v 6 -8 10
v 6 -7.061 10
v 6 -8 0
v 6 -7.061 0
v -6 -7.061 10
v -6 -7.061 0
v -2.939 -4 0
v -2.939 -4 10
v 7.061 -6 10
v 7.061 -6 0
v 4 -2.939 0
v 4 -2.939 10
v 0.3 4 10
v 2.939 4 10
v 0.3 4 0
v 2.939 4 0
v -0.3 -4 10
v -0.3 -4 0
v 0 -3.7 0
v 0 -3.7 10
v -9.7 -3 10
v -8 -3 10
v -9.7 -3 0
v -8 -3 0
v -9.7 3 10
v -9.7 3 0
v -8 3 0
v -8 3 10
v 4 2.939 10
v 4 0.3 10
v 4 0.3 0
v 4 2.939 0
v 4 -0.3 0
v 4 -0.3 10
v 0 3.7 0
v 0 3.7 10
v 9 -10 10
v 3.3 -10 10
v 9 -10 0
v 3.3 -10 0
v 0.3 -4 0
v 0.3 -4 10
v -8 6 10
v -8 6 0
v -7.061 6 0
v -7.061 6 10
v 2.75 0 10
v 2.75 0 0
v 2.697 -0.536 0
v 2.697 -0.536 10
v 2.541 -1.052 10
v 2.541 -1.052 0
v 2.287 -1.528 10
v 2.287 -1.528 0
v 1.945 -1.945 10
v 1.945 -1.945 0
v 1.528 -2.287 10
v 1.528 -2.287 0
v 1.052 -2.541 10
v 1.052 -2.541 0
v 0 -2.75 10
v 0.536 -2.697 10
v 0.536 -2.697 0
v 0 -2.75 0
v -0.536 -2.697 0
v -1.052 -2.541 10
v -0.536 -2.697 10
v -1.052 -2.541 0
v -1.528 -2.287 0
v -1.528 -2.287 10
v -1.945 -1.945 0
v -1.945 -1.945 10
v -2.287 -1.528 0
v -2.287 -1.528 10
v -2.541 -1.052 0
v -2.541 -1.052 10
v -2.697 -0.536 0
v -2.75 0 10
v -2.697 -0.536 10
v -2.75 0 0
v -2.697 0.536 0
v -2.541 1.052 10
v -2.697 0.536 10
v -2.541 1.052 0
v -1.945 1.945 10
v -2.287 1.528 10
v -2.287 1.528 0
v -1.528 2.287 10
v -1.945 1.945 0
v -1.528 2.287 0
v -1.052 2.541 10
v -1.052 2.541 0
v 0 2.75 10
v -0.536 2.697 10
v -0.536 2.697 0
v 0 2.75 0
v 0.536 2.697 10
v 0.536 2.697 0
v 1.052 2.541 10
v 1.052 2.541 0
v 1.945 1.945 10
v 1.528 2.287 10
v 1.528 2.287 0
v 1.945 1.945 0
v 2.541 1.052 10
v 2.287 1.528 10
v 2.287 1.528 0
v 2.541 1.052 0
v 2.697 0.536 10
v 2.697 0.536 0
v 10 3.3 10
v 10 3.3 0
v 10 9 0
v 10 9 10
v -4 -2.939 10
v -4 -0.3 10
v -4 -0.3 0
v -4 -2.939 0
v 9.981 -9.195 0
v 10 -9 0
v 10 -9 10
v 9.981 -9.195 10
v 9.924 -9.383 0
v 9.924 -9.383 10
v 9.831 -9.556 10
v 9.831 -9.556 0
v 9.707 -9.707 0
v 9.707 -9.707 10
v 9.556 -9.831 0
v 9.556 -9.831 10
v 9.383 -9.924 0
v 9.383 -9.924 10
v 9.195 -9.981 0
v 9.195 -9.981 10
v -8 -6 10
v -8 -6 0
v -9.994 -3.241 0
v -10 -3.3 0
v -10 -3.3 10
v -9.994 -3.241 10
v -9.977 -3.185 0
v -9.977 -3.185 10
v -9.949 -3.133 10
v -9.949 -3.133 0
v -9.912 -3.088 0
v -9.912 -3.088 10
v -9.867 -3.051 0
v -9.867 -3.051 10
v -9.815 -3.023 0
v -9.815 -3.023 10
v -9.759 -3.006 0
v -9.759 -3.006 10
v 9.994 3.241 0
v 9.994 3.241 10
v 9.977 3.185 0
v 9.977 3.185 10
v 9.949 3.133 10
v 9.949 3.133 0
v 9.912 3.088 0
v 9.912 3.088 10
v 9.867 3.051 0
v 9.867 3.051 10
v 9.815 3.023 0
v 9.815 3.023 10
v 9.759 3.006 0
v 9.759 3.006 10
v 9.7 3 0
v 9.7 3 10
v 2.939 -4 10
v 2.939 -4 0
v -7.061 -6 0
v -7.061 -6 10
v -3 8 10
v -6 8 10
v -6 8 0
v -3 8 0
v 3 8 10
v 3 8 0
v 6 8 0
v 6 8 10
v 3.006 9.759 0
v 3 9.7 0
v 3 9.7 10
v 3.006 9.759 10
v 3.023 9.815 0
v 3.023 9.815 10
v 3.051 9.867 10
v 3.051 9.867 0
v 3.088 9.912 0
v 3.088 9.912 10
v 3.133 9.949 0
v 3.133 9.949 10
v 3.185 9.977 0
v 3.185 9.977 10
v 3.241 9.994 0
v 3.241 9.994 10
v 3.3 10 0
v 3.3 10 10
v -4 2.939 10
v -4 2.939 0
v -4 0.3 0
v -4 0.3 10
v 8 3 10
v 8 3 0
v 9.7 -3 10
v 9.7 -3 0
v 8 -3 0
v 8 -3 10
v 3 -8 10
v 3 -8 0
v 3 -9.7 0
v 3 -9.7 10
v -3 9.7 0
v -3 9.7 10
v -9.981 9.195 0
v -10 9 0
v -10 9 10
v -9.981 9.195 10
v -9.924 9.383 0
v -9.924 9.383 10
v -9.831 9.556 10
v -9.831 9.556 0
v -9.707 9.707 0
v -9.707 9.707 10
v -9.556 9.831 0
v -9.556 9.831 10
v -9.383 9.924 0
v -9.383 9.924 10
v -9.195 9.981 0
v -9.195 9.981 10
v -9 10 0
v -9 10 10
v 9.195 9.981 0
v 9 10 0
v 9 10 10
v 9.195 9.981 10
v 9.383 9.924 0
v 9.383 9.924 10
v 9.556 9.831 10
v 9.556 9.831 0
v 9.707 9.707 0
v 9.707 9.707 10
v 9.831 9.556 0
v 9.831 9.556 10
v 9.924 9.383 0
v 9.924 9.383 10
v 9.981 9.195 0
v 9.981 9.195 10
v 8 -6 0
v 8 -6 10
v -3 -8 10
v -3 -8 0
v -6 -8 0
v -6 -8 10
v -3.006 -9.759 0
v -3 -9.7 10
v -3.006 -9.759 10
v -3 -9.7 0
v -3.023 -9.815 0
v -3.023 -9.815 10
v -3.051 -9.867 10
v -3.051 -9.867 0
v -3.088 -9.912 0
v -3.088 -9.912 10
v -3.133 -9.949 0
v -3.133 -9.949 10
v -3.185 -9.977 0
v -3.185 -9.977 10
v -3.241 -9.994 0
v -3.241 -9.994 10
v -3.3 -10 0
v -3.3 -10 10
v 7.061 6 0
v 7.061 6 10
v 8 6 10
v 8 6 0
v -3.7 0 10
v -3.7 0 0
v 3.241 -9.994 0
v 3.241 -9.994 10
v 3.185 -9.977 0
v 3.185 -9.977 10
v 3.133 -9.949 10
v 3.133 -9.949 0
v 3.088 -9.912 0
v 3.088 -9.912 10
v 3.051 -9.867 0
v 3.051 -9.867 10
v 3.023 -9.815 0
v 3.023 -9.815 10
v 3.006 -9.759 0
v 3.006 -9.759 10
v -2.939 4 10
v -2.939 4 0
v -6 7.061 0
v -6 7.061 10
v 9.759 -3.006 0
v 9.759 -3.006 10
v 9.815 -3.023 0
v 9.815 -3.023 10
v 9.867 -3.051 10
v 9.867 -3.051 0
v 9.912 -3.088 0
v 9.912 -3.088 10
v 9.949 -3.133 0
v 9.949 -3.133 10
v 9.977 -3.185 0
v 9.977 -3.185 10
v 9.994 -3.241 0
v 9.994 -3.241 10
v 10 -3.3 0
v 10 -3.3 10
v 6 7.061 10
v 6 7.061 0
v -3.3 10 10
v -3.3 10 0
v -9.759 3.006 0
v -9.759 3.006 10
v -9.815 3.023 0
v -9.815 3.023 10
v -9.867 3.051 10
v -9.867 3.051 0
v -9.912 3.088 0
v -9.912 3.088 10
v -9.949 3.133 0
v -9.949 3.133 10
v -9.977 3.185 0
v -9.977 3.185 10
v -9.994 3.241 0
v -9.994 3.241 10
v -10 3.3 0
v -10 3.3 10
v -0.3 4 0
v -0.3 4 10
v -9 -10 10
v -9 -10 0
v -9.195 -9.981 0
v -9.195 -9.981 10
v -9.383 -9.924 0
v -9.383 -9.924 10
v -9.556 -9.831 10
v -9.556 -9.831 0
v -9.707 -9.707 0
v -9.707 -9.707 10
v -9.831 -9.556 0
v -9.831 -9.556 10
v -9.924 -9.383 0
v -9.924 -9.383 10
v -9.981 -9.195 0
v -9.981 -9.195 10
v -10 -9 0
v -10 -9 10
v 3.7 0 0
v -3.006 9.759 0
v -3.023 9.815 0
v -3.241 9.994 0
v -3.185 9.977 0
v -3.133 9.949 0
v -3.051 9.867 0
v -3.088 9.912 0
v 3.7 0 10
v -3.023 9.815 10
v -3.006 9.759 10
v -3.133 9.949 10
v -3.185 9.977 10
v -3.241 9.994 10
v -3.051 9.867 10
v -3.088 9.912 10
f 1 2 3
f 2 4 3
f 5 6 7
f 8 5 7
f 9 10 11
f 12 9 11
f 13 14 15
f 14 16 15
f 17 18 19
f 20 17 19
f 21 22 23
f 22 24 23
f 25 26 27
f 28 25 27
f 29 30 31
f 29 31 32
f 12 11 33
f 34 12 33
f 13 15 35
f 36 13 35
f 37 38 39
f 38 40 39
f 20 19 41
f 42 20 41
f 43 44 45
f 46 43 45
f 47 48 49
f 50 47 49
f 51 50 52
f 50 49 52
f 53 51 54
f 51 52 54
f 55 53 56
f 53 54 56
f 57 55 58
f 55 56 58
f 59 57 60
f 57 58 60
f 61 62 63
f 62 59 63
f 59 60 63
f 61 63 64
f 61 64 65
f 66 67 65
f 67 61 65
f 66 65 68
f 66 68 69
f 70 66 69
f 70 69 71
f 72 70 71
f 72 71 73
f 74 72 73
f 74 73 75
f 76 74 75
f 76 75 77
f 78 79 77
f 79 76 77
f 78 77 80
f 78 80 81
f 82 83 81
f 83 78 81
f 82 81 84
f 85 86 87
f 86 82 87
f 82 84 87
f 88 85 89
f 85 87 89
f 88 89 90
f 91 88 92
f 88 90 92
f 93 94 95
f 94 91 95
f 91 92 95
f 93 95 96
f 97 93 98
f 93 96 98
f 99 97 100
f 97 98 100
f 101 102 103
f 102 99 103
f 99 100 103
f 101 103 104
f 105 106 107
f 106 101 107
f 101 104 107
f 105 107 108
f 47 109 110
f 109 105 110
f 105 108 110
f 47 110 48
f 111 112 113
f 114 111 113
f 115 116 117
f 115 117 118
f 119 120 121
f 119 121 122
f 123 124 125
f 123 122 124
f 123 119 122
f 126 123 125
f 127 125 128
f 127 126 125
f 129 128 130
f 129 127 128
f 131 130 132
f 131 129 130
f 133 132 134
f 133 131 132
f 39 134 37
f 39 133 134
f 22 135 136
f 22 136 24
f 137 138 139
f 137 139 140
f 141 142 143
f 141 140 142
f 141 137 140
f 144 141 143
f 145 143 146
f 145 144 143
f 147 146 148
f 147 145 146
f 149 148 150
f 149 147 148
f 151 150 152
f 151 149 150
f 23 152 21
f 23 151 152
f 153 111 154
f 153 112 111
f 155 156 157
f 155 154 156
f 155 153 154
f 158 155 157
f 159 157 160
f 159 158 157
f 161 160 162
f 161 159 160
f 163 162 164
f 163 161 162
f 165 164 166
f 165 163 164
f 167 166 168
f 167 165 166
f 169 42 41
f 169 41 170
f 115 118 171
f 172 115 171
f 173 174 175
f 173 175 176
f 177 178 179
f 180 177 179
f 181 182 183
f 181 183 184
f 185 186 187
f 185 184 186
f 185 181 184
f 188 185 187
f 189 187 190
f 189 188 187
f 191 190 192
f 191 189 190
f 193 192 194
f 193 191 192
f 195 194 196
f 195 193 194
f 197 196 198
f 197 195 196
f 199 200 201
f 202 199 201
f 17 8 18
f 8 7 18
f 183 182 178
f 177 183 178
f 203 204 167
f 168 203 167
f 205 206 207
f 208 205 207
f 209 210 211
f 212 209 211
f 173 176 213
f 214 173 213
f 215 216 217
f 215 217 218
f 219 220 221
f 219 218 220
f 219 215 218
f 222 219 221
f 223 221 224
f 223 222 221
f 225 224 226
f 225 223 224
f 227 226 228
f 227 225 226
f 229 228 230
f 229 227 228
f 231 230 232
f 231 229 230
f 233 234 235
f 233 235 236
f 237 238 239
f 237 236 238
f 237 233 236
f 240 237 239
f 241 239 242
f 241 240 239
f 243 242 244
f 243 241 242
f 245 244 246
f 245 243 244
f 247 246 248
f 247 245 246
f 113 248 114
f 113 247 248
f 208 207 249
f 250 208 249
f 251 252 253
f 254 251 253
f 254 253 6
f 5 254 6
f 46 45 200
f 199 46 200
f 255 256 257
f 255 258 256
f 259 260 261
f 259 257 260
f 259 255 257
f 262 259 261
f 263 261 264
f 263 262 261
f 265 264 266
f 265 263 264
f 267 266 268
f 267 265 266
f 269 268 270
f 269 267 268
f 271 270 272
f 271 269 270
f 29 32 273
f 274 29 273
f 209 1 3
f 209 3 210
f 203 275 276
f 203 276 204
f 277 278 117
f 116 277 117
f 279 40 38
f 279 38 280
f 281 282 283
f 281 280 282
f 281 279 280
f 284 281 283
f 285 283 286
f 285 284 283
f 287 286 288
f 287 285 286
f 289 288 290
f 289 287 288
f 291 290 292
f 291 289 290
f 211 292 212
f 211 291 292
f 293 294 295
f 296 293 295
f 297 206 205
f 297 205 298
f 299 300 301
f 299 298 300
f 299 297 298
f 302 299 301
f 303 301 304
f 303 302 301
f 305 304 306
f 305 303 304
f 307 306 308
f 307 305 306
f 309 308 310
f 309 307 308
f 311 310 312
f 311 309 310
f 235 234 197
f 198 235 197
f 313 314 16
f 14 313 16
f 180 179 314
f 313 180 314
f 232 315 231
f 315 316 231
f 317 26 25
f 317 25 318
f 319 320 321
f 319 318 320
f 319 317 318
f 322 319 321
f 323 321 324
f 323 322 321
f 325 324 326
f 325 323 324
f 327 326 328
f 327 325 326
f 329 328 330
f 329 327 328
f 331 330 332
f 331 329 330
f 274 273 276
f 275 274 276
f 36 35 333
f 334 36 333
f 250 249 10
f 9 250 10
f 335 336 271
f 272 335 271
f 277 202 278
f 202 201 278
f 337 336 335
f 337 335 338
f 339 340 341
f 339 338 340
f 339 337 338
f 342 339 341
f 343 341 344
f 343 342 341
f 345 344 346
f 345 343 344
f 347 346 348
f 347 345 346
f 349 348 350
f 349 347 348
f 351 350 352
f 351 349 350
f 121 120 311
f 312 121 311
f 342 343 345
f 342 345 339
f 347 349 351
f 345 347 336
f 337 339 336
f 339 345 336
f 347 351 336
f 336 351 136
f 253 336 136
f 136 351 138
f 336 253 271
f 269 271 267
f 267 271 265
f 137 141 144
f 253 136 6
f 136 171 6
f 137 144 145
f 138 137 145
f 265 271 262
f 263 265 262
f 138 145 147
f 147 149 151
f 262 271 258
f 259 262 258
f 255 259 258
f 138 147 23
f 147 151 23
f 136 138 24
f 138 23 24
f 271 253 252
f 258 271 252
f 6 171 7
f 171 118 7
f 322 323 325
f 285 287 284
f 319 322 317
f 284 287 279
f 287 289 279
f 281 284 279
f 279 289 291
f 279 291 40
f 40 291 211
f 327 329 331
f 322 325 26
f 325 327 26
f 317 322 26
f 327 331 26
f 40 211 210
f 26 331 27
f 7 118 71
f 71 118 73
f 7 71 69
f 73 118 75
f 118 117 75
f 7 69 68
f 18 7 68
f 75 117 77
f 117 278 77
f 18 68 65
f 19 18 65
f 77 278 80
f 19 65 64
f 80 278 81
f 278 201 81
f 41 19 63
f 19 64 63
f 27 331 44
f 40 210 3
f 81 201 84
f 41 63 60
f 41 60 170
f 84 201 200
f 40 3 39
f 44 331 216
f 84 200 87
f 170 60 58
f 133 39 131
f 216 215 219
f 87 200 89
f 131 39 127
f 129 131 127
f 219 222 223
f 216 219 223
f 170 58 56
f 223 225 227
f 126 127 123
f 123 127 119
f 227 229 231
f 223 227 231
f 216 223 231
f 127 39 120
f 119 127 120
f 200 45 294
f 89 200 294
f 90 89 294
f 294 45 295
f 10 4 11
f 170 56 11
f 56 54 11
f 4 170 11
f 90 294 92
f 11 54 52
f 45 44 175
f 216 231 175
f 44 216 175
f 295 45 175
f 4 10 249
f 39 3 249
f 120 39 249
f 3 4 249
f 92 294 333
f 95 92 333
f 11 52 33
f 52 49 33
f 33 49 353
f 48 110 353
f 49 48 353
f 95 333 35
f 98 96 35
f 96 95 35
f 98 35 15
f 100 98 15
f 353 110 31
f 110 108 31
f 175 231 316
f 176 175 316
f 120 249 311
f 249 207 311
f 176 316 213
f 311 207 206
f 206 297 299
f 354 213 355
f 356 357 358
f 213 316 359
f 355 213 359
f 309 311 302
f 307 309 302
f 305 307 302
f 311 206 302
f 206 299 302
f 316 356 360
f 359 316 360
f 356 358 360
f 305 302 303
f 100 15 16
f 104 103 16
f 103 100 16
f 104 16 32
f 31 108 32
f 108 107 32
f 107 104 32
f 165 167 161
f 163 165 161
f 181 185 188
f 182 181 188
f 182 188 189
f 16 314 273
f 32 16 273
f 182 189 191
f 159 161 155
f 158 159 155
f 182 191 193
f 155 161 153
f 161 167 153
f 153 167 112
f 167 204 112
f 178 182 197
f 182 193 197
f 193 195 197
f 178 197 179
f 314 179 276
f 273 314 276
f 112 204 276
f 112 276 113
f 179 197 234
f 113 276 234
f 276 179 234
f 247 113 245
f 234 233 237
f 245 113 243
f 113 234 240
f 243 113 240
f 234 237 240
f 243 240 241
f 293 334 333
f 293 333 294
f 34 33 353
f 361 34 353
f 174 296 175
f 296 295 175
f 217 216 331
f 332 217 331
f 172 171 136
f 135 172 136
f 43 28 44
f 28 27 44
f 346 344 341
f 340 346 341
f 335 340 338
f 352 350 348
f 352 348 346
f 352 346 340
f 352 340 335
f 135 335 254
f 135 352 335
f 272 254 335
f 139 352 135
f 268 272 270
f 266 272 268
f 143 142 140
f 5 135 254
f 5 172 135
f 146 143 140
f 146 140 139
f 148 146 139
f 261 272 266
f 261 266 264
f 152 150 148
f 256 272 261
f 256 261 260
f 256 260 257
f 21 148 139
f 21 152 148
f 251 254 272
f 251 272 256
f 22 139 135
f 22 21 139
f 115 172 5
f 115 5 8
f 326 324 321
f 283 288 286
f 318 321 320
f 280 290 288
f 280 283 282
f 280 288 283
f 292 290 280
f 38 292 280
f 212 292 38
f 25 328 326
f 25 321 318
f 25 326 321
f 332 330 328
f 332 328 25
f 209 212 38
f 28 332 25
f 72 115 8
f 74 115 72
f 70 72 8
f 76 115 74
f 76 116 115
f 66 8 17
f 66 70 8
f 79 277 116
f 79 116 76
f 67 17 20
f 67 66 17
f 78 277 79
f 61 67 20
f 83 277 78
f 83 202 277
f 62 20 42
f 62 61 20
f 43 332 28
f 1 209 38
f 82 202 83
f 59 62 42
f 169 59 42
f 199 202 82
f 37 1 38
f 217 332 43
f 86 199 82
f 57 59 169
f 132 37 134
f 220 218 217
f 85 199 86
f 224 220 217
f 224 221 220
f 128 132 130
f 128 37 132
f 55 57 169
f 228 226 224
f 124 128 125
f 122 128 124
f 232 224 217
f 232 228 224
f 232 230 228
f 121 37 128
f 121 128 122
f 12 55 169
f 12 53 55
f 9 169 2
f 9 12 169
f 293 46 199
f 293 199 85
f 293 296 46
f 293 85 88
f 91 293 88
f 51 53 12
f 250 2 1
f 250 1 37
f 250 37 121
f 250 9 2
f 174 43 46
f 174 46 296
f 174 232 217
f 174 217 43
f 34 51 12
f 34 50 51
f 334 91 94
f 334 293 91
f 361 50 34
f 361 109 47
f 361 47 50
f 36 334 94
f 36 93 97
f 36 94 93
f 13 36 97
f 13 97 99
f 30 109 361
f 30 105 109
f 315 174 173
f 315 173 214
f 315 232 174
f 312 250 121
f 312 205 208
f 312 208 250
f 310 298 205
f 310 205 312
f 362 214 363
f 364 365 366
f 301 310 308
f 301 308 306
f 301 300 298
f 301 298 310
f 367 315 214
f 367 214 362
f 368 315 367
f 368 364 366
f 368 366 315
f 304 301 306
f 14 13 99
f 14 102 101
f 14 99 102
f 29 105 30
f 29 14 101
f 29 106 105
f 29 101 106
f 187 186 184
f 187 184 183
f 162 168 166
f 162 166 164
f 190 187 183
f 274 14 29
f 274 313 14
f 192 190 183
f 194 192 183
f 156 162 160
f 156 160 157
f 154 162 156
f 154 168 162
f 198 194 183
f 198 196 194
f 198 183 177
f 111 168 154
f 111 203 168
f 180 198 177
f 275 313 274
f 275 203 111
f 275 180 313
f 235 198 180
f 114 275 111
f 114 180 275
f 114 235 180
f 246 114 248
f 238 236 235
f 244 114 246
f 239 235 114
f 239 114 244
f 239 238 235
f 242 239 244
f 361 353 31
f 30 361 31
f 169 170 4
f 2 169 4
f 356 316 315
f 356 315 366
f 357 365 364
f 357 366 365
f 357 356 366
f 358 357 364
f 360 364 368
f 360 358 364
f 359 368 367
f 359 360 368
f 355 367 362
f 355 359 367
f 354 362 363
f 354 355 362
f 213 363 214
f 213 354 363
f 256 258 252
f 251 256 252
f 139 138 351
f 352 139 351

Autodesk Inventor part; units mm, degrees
ref_plane "Startebene" through (0, 0, 0) normal (0, 0, 1) x (1, 0, 0)
ref_plane "Endebene" through (0, 0, 320) normal (0, 0, 1) x (1, 0, 0)
ref_plane "Startebene1" through (0, 0, 0) normal (0, 0, 1) x (1, 0, 0)
ref_plane "Endebene1" through (0, 0, 10) normal (0, 0, 1) x (1, 0, 0)
ref_plane "Startebene2" through (0, 0, 0) normal (0, 0, 1) x (1, 0, 0)
ref_plane "Endebene2" through (0, 0, 10) normal (0, 0, 1) x (1, 0, 0)
sketch "Skizze" plane through (0, 0, 0) normal (0, 0, 1) x (1, 0, 0)
  line L0 (-10, 9) -> (-10, 3.3)
  arc A0 (-10, 3.3) -> (-9.7, 3) centre (-9.7, 3.3) ccw
  line L1 (-9.7, 3) -> (-8, 3)
  line L2 (-8, 3) -> (-8, 6)
  line L3 (-8, 6) -> (-7.0607, 6)
  line L4 (-7.0607, 6) -> (-4, 2.9393)
  line L5 (-4, 2.9393) -> (-4, 0.3)
  line L6 (-4, 0.3) -> (-3.7, 0)
  line L7 (-3.7, 0) -> (-4, -0.3)
  line L8 (-4, -0.3) -> (-4, -2.9393)
  line L9 (-4, -2.9393) -> (-7.0607, -6)
  line L10 (-7.0607, -6) -> (-8, -6)
  line L11 (-8, -6) -> (-8, -3)
  line L12 (-8, -3) -> (-9.7, -3)
  arc A1 (-9.7, -3) -> (-10, -3.3) centre (-9.7, -3.3) ccw
  line L13 (-10, -3.3) -> (-10, -9)
  arc A2 (-10, -9) -> (-9, -10) centre (-9, -9) ccw
  line L14 (-9, -10) -> (-3.3, -10)
  arc A3 (-3.3, -10) -> (-3, -9.7) centre (-3.3, -9.7) ccw
  line L15 (-3, -9.7) -> (-3, -8)
  line L16 (-3, -8) -> (-6, -8)
  line L17 (-6, -8) -> (-6, -7.0607)
  line L18 (-6, -7.0607) -> (-2.9393, -4)
  line L19 (-2.9393, -4) -> (-0.3, -4)
  line L20 (-0.3, -4) -> (0, -3.7)
  line L21 (0, -3.7) -> (0.3, -4)
  line L22 (0.3, -4) -> (2.9393, -4)
  line L23 (2.9393, -4) -> (6, -7.0607)
  line L24 (6, -7.0607) -> (6, -8)
  line L25 (6, -8) -> (3, -8)
  line L26 (3, -8) -> (3, -9.7)
  arc A4 (3, -9.7) -> (3.3, -10) centre (3.3, -9.7) ccw
  line L27 (3.3, -10) -> (9, -10)
  arc A5 (9, -10) -> (10, -9) centre (9, -9) ccw
  line L28 (10, -9) -> (10, -3.3)
  arc A6 (10, -3.3) -> (9.7, -3) centre (9.7, -3.3) ccw
  line L29 (9.7, -3) -> (8, -3)
  line L30 (8, -3) -> (8, -6)
  line L31 (8, -6) -> (7.0607, -6)
  line L32 (7.0607, -6) -> (4, -2.9393)
  line L33 (4, -2.9393) -> (4, -0.3)
  line L34 (4, -0.3) -> (3.7, 0)
  line L35 (3.7, 0) -> (4, 0.3)
  line L36 (4, 0.3) -> (4, 2.9393)
  line L37 (4, 2.9393) -> (7.0607, 6)
  line L38 (7.0607, 6) -> (8, 6)
  line L39 (8, 6) -> (8, 3)
  line L40 (8, 3) -> (9.7, 3)
  arc A7 (9.7, 3) -> (10, 3.3) centre (9.7, 3.3) ccw
  line L41 (10, 3.3) -> (10, 9)
  arc A8 (10, 9) -> (9, 10) centre (9, 9) ccw
  line L42 (9, 10) -> (3.3, 10)
  arc A9 (3.3, 10) -> (3, 9.7) centre (3.3, 9.7) ccw
  line L43 (3, 9.7) -> (3, 8)
  line L44 (3, 8) -> (6, 8)
  line L45 (6, 8) -> (6, 7.0607)
  line L46 (6, 7.0607) -> (2.9393, 4)
  line L47 (2.9393, 4) -> (0.3, 4)
  line L48 (0.3, 4) -> (0, 3.7)
  line L49 (0, 3.7) -> (-0.3, 4)
  line L50 (-0.3, 4) -> (-2.9393, 4)
  line L51 (-2.9393, 4) -> (-6, 7.0607)
  line L52 (-6, 7.0607) -> (-6, 8)
  line L53 (-6, 8) -> (-3, 8)
  line L54 (-3, 8) -> (-3, 9.7)
  arc A10 (-3, 9.7) -> (-3.3, 10) centre (-3.3, 9.7) ccw
  line L55 (-3.3, 10) -> (-9, 10)
  arc A11 (-9, 10) -> (-10, 9) centre (-9, 9) ccw
  circle A12 centre (0, 0) radius 2.75
  dimension "d2" = 5.5
  dimension "d3" = 10
  dimension "d4" = 10
  dimension "d5" = 5.7
  dimension "d6" = 5.7
  dimension "d7" = 1.7
  dimension "d8" = 3
  dimension "d9" = 0.3
  dimension "d10" = 90
  dimension "d11" = 45
  dimension "d12" = 45
  dimension "d13" = 45
  dimension "d14" = 90
  dimension "d15" = 90
  dimension "d16" = 45
  dimension "d17" = 45
  dimension "d18" = 45
  dimension "d19" = 45
  dimension "d20" = 90
  dimension "d21" = 90
  dimension "d22" = 45
  dimension "d23" = 45
  dimension "d24" = 90
  dimension "d25" = 90
  dimension "d26" = 90
  dimension "d27" = 90
  dimension "d28" = 90
  dimension "d29" = 90
  dimension "d30" = 90
  dimension "d31" = 90
  dimension "d32" = 90
  dimension "d33" = 90
  dimension "d34" = 90
  dimension "d35" = 90
  dimension "d36" = 90
  dimension "d37" = 90
  dimension "d38" = 90
  dimension "d39" = 4
  dimension "d40" = 6
  dimension "d41" = 13
  dimension "d42" = 14
  dimension "d43" = 16
  dimension "d44" = 18
  dimension "d45" = 3
  dimension "d46" = 9
  dimension "d47" = 7
  dimension "d48" = 1
  dimension "d49" = 7
  dimension "d50" = 1.5
  dimension "d51" = 1.8663
  dimension "d52" = 3.3663
  dimension "d53" = 1.5
  dimension "d54" = 1.8663
  dimension "d55" = 3.3663
  dimension "d56" = 4
  dimension "d57" = 10.8187
  dimension "d58" = 1.9092
  dimension "d59" = 5
  dimension "d60" = 13
  dimension "d61" = 13
  dimension "d62" = 16.0513
  dimension "d63" = 3.3234
  dimension "d64" = 14
  dimension "d65" = 12.685
extrude "Körper" add sketch "Skizze" along normal up to surface (10 mm away) from surface at 0
sketch "Skizze13" plane through (0, 0, 0) normal (0, 0, 1) x (1, 0, 0)
  line L0 (0, 0) -> (10, 0)
ref_plane "Arbeitsebene12" through (0, 0, 0) normal (0, -1, 0) x (1, 0, 0)
sketch "Skizze14" plane through (0, 0, 0) normal (0, -1, 0) x (1, 0, 0)
  line L0 (-2, 0) -> (12, 0)
  line L1 (-2, 10) -> (12, 10)
  dimension "d80" = 10
equation "\"G_OFFSET_START\" = 0"
equation "\"G_OFFSET_END\" = 0"
equation "\"G_L\" = d80"
equation "\"G_OFFSET_START1\" = 0"
equation "\"G_OFFSET_END1\" = 0"
equation "\"G_OFFSET_START2\" = 0"
equation "\"G_OFFSET_END2\" = 0"
properties part number "Alu Profil 20x20 - AP2020" material "Aluminium 6061"
